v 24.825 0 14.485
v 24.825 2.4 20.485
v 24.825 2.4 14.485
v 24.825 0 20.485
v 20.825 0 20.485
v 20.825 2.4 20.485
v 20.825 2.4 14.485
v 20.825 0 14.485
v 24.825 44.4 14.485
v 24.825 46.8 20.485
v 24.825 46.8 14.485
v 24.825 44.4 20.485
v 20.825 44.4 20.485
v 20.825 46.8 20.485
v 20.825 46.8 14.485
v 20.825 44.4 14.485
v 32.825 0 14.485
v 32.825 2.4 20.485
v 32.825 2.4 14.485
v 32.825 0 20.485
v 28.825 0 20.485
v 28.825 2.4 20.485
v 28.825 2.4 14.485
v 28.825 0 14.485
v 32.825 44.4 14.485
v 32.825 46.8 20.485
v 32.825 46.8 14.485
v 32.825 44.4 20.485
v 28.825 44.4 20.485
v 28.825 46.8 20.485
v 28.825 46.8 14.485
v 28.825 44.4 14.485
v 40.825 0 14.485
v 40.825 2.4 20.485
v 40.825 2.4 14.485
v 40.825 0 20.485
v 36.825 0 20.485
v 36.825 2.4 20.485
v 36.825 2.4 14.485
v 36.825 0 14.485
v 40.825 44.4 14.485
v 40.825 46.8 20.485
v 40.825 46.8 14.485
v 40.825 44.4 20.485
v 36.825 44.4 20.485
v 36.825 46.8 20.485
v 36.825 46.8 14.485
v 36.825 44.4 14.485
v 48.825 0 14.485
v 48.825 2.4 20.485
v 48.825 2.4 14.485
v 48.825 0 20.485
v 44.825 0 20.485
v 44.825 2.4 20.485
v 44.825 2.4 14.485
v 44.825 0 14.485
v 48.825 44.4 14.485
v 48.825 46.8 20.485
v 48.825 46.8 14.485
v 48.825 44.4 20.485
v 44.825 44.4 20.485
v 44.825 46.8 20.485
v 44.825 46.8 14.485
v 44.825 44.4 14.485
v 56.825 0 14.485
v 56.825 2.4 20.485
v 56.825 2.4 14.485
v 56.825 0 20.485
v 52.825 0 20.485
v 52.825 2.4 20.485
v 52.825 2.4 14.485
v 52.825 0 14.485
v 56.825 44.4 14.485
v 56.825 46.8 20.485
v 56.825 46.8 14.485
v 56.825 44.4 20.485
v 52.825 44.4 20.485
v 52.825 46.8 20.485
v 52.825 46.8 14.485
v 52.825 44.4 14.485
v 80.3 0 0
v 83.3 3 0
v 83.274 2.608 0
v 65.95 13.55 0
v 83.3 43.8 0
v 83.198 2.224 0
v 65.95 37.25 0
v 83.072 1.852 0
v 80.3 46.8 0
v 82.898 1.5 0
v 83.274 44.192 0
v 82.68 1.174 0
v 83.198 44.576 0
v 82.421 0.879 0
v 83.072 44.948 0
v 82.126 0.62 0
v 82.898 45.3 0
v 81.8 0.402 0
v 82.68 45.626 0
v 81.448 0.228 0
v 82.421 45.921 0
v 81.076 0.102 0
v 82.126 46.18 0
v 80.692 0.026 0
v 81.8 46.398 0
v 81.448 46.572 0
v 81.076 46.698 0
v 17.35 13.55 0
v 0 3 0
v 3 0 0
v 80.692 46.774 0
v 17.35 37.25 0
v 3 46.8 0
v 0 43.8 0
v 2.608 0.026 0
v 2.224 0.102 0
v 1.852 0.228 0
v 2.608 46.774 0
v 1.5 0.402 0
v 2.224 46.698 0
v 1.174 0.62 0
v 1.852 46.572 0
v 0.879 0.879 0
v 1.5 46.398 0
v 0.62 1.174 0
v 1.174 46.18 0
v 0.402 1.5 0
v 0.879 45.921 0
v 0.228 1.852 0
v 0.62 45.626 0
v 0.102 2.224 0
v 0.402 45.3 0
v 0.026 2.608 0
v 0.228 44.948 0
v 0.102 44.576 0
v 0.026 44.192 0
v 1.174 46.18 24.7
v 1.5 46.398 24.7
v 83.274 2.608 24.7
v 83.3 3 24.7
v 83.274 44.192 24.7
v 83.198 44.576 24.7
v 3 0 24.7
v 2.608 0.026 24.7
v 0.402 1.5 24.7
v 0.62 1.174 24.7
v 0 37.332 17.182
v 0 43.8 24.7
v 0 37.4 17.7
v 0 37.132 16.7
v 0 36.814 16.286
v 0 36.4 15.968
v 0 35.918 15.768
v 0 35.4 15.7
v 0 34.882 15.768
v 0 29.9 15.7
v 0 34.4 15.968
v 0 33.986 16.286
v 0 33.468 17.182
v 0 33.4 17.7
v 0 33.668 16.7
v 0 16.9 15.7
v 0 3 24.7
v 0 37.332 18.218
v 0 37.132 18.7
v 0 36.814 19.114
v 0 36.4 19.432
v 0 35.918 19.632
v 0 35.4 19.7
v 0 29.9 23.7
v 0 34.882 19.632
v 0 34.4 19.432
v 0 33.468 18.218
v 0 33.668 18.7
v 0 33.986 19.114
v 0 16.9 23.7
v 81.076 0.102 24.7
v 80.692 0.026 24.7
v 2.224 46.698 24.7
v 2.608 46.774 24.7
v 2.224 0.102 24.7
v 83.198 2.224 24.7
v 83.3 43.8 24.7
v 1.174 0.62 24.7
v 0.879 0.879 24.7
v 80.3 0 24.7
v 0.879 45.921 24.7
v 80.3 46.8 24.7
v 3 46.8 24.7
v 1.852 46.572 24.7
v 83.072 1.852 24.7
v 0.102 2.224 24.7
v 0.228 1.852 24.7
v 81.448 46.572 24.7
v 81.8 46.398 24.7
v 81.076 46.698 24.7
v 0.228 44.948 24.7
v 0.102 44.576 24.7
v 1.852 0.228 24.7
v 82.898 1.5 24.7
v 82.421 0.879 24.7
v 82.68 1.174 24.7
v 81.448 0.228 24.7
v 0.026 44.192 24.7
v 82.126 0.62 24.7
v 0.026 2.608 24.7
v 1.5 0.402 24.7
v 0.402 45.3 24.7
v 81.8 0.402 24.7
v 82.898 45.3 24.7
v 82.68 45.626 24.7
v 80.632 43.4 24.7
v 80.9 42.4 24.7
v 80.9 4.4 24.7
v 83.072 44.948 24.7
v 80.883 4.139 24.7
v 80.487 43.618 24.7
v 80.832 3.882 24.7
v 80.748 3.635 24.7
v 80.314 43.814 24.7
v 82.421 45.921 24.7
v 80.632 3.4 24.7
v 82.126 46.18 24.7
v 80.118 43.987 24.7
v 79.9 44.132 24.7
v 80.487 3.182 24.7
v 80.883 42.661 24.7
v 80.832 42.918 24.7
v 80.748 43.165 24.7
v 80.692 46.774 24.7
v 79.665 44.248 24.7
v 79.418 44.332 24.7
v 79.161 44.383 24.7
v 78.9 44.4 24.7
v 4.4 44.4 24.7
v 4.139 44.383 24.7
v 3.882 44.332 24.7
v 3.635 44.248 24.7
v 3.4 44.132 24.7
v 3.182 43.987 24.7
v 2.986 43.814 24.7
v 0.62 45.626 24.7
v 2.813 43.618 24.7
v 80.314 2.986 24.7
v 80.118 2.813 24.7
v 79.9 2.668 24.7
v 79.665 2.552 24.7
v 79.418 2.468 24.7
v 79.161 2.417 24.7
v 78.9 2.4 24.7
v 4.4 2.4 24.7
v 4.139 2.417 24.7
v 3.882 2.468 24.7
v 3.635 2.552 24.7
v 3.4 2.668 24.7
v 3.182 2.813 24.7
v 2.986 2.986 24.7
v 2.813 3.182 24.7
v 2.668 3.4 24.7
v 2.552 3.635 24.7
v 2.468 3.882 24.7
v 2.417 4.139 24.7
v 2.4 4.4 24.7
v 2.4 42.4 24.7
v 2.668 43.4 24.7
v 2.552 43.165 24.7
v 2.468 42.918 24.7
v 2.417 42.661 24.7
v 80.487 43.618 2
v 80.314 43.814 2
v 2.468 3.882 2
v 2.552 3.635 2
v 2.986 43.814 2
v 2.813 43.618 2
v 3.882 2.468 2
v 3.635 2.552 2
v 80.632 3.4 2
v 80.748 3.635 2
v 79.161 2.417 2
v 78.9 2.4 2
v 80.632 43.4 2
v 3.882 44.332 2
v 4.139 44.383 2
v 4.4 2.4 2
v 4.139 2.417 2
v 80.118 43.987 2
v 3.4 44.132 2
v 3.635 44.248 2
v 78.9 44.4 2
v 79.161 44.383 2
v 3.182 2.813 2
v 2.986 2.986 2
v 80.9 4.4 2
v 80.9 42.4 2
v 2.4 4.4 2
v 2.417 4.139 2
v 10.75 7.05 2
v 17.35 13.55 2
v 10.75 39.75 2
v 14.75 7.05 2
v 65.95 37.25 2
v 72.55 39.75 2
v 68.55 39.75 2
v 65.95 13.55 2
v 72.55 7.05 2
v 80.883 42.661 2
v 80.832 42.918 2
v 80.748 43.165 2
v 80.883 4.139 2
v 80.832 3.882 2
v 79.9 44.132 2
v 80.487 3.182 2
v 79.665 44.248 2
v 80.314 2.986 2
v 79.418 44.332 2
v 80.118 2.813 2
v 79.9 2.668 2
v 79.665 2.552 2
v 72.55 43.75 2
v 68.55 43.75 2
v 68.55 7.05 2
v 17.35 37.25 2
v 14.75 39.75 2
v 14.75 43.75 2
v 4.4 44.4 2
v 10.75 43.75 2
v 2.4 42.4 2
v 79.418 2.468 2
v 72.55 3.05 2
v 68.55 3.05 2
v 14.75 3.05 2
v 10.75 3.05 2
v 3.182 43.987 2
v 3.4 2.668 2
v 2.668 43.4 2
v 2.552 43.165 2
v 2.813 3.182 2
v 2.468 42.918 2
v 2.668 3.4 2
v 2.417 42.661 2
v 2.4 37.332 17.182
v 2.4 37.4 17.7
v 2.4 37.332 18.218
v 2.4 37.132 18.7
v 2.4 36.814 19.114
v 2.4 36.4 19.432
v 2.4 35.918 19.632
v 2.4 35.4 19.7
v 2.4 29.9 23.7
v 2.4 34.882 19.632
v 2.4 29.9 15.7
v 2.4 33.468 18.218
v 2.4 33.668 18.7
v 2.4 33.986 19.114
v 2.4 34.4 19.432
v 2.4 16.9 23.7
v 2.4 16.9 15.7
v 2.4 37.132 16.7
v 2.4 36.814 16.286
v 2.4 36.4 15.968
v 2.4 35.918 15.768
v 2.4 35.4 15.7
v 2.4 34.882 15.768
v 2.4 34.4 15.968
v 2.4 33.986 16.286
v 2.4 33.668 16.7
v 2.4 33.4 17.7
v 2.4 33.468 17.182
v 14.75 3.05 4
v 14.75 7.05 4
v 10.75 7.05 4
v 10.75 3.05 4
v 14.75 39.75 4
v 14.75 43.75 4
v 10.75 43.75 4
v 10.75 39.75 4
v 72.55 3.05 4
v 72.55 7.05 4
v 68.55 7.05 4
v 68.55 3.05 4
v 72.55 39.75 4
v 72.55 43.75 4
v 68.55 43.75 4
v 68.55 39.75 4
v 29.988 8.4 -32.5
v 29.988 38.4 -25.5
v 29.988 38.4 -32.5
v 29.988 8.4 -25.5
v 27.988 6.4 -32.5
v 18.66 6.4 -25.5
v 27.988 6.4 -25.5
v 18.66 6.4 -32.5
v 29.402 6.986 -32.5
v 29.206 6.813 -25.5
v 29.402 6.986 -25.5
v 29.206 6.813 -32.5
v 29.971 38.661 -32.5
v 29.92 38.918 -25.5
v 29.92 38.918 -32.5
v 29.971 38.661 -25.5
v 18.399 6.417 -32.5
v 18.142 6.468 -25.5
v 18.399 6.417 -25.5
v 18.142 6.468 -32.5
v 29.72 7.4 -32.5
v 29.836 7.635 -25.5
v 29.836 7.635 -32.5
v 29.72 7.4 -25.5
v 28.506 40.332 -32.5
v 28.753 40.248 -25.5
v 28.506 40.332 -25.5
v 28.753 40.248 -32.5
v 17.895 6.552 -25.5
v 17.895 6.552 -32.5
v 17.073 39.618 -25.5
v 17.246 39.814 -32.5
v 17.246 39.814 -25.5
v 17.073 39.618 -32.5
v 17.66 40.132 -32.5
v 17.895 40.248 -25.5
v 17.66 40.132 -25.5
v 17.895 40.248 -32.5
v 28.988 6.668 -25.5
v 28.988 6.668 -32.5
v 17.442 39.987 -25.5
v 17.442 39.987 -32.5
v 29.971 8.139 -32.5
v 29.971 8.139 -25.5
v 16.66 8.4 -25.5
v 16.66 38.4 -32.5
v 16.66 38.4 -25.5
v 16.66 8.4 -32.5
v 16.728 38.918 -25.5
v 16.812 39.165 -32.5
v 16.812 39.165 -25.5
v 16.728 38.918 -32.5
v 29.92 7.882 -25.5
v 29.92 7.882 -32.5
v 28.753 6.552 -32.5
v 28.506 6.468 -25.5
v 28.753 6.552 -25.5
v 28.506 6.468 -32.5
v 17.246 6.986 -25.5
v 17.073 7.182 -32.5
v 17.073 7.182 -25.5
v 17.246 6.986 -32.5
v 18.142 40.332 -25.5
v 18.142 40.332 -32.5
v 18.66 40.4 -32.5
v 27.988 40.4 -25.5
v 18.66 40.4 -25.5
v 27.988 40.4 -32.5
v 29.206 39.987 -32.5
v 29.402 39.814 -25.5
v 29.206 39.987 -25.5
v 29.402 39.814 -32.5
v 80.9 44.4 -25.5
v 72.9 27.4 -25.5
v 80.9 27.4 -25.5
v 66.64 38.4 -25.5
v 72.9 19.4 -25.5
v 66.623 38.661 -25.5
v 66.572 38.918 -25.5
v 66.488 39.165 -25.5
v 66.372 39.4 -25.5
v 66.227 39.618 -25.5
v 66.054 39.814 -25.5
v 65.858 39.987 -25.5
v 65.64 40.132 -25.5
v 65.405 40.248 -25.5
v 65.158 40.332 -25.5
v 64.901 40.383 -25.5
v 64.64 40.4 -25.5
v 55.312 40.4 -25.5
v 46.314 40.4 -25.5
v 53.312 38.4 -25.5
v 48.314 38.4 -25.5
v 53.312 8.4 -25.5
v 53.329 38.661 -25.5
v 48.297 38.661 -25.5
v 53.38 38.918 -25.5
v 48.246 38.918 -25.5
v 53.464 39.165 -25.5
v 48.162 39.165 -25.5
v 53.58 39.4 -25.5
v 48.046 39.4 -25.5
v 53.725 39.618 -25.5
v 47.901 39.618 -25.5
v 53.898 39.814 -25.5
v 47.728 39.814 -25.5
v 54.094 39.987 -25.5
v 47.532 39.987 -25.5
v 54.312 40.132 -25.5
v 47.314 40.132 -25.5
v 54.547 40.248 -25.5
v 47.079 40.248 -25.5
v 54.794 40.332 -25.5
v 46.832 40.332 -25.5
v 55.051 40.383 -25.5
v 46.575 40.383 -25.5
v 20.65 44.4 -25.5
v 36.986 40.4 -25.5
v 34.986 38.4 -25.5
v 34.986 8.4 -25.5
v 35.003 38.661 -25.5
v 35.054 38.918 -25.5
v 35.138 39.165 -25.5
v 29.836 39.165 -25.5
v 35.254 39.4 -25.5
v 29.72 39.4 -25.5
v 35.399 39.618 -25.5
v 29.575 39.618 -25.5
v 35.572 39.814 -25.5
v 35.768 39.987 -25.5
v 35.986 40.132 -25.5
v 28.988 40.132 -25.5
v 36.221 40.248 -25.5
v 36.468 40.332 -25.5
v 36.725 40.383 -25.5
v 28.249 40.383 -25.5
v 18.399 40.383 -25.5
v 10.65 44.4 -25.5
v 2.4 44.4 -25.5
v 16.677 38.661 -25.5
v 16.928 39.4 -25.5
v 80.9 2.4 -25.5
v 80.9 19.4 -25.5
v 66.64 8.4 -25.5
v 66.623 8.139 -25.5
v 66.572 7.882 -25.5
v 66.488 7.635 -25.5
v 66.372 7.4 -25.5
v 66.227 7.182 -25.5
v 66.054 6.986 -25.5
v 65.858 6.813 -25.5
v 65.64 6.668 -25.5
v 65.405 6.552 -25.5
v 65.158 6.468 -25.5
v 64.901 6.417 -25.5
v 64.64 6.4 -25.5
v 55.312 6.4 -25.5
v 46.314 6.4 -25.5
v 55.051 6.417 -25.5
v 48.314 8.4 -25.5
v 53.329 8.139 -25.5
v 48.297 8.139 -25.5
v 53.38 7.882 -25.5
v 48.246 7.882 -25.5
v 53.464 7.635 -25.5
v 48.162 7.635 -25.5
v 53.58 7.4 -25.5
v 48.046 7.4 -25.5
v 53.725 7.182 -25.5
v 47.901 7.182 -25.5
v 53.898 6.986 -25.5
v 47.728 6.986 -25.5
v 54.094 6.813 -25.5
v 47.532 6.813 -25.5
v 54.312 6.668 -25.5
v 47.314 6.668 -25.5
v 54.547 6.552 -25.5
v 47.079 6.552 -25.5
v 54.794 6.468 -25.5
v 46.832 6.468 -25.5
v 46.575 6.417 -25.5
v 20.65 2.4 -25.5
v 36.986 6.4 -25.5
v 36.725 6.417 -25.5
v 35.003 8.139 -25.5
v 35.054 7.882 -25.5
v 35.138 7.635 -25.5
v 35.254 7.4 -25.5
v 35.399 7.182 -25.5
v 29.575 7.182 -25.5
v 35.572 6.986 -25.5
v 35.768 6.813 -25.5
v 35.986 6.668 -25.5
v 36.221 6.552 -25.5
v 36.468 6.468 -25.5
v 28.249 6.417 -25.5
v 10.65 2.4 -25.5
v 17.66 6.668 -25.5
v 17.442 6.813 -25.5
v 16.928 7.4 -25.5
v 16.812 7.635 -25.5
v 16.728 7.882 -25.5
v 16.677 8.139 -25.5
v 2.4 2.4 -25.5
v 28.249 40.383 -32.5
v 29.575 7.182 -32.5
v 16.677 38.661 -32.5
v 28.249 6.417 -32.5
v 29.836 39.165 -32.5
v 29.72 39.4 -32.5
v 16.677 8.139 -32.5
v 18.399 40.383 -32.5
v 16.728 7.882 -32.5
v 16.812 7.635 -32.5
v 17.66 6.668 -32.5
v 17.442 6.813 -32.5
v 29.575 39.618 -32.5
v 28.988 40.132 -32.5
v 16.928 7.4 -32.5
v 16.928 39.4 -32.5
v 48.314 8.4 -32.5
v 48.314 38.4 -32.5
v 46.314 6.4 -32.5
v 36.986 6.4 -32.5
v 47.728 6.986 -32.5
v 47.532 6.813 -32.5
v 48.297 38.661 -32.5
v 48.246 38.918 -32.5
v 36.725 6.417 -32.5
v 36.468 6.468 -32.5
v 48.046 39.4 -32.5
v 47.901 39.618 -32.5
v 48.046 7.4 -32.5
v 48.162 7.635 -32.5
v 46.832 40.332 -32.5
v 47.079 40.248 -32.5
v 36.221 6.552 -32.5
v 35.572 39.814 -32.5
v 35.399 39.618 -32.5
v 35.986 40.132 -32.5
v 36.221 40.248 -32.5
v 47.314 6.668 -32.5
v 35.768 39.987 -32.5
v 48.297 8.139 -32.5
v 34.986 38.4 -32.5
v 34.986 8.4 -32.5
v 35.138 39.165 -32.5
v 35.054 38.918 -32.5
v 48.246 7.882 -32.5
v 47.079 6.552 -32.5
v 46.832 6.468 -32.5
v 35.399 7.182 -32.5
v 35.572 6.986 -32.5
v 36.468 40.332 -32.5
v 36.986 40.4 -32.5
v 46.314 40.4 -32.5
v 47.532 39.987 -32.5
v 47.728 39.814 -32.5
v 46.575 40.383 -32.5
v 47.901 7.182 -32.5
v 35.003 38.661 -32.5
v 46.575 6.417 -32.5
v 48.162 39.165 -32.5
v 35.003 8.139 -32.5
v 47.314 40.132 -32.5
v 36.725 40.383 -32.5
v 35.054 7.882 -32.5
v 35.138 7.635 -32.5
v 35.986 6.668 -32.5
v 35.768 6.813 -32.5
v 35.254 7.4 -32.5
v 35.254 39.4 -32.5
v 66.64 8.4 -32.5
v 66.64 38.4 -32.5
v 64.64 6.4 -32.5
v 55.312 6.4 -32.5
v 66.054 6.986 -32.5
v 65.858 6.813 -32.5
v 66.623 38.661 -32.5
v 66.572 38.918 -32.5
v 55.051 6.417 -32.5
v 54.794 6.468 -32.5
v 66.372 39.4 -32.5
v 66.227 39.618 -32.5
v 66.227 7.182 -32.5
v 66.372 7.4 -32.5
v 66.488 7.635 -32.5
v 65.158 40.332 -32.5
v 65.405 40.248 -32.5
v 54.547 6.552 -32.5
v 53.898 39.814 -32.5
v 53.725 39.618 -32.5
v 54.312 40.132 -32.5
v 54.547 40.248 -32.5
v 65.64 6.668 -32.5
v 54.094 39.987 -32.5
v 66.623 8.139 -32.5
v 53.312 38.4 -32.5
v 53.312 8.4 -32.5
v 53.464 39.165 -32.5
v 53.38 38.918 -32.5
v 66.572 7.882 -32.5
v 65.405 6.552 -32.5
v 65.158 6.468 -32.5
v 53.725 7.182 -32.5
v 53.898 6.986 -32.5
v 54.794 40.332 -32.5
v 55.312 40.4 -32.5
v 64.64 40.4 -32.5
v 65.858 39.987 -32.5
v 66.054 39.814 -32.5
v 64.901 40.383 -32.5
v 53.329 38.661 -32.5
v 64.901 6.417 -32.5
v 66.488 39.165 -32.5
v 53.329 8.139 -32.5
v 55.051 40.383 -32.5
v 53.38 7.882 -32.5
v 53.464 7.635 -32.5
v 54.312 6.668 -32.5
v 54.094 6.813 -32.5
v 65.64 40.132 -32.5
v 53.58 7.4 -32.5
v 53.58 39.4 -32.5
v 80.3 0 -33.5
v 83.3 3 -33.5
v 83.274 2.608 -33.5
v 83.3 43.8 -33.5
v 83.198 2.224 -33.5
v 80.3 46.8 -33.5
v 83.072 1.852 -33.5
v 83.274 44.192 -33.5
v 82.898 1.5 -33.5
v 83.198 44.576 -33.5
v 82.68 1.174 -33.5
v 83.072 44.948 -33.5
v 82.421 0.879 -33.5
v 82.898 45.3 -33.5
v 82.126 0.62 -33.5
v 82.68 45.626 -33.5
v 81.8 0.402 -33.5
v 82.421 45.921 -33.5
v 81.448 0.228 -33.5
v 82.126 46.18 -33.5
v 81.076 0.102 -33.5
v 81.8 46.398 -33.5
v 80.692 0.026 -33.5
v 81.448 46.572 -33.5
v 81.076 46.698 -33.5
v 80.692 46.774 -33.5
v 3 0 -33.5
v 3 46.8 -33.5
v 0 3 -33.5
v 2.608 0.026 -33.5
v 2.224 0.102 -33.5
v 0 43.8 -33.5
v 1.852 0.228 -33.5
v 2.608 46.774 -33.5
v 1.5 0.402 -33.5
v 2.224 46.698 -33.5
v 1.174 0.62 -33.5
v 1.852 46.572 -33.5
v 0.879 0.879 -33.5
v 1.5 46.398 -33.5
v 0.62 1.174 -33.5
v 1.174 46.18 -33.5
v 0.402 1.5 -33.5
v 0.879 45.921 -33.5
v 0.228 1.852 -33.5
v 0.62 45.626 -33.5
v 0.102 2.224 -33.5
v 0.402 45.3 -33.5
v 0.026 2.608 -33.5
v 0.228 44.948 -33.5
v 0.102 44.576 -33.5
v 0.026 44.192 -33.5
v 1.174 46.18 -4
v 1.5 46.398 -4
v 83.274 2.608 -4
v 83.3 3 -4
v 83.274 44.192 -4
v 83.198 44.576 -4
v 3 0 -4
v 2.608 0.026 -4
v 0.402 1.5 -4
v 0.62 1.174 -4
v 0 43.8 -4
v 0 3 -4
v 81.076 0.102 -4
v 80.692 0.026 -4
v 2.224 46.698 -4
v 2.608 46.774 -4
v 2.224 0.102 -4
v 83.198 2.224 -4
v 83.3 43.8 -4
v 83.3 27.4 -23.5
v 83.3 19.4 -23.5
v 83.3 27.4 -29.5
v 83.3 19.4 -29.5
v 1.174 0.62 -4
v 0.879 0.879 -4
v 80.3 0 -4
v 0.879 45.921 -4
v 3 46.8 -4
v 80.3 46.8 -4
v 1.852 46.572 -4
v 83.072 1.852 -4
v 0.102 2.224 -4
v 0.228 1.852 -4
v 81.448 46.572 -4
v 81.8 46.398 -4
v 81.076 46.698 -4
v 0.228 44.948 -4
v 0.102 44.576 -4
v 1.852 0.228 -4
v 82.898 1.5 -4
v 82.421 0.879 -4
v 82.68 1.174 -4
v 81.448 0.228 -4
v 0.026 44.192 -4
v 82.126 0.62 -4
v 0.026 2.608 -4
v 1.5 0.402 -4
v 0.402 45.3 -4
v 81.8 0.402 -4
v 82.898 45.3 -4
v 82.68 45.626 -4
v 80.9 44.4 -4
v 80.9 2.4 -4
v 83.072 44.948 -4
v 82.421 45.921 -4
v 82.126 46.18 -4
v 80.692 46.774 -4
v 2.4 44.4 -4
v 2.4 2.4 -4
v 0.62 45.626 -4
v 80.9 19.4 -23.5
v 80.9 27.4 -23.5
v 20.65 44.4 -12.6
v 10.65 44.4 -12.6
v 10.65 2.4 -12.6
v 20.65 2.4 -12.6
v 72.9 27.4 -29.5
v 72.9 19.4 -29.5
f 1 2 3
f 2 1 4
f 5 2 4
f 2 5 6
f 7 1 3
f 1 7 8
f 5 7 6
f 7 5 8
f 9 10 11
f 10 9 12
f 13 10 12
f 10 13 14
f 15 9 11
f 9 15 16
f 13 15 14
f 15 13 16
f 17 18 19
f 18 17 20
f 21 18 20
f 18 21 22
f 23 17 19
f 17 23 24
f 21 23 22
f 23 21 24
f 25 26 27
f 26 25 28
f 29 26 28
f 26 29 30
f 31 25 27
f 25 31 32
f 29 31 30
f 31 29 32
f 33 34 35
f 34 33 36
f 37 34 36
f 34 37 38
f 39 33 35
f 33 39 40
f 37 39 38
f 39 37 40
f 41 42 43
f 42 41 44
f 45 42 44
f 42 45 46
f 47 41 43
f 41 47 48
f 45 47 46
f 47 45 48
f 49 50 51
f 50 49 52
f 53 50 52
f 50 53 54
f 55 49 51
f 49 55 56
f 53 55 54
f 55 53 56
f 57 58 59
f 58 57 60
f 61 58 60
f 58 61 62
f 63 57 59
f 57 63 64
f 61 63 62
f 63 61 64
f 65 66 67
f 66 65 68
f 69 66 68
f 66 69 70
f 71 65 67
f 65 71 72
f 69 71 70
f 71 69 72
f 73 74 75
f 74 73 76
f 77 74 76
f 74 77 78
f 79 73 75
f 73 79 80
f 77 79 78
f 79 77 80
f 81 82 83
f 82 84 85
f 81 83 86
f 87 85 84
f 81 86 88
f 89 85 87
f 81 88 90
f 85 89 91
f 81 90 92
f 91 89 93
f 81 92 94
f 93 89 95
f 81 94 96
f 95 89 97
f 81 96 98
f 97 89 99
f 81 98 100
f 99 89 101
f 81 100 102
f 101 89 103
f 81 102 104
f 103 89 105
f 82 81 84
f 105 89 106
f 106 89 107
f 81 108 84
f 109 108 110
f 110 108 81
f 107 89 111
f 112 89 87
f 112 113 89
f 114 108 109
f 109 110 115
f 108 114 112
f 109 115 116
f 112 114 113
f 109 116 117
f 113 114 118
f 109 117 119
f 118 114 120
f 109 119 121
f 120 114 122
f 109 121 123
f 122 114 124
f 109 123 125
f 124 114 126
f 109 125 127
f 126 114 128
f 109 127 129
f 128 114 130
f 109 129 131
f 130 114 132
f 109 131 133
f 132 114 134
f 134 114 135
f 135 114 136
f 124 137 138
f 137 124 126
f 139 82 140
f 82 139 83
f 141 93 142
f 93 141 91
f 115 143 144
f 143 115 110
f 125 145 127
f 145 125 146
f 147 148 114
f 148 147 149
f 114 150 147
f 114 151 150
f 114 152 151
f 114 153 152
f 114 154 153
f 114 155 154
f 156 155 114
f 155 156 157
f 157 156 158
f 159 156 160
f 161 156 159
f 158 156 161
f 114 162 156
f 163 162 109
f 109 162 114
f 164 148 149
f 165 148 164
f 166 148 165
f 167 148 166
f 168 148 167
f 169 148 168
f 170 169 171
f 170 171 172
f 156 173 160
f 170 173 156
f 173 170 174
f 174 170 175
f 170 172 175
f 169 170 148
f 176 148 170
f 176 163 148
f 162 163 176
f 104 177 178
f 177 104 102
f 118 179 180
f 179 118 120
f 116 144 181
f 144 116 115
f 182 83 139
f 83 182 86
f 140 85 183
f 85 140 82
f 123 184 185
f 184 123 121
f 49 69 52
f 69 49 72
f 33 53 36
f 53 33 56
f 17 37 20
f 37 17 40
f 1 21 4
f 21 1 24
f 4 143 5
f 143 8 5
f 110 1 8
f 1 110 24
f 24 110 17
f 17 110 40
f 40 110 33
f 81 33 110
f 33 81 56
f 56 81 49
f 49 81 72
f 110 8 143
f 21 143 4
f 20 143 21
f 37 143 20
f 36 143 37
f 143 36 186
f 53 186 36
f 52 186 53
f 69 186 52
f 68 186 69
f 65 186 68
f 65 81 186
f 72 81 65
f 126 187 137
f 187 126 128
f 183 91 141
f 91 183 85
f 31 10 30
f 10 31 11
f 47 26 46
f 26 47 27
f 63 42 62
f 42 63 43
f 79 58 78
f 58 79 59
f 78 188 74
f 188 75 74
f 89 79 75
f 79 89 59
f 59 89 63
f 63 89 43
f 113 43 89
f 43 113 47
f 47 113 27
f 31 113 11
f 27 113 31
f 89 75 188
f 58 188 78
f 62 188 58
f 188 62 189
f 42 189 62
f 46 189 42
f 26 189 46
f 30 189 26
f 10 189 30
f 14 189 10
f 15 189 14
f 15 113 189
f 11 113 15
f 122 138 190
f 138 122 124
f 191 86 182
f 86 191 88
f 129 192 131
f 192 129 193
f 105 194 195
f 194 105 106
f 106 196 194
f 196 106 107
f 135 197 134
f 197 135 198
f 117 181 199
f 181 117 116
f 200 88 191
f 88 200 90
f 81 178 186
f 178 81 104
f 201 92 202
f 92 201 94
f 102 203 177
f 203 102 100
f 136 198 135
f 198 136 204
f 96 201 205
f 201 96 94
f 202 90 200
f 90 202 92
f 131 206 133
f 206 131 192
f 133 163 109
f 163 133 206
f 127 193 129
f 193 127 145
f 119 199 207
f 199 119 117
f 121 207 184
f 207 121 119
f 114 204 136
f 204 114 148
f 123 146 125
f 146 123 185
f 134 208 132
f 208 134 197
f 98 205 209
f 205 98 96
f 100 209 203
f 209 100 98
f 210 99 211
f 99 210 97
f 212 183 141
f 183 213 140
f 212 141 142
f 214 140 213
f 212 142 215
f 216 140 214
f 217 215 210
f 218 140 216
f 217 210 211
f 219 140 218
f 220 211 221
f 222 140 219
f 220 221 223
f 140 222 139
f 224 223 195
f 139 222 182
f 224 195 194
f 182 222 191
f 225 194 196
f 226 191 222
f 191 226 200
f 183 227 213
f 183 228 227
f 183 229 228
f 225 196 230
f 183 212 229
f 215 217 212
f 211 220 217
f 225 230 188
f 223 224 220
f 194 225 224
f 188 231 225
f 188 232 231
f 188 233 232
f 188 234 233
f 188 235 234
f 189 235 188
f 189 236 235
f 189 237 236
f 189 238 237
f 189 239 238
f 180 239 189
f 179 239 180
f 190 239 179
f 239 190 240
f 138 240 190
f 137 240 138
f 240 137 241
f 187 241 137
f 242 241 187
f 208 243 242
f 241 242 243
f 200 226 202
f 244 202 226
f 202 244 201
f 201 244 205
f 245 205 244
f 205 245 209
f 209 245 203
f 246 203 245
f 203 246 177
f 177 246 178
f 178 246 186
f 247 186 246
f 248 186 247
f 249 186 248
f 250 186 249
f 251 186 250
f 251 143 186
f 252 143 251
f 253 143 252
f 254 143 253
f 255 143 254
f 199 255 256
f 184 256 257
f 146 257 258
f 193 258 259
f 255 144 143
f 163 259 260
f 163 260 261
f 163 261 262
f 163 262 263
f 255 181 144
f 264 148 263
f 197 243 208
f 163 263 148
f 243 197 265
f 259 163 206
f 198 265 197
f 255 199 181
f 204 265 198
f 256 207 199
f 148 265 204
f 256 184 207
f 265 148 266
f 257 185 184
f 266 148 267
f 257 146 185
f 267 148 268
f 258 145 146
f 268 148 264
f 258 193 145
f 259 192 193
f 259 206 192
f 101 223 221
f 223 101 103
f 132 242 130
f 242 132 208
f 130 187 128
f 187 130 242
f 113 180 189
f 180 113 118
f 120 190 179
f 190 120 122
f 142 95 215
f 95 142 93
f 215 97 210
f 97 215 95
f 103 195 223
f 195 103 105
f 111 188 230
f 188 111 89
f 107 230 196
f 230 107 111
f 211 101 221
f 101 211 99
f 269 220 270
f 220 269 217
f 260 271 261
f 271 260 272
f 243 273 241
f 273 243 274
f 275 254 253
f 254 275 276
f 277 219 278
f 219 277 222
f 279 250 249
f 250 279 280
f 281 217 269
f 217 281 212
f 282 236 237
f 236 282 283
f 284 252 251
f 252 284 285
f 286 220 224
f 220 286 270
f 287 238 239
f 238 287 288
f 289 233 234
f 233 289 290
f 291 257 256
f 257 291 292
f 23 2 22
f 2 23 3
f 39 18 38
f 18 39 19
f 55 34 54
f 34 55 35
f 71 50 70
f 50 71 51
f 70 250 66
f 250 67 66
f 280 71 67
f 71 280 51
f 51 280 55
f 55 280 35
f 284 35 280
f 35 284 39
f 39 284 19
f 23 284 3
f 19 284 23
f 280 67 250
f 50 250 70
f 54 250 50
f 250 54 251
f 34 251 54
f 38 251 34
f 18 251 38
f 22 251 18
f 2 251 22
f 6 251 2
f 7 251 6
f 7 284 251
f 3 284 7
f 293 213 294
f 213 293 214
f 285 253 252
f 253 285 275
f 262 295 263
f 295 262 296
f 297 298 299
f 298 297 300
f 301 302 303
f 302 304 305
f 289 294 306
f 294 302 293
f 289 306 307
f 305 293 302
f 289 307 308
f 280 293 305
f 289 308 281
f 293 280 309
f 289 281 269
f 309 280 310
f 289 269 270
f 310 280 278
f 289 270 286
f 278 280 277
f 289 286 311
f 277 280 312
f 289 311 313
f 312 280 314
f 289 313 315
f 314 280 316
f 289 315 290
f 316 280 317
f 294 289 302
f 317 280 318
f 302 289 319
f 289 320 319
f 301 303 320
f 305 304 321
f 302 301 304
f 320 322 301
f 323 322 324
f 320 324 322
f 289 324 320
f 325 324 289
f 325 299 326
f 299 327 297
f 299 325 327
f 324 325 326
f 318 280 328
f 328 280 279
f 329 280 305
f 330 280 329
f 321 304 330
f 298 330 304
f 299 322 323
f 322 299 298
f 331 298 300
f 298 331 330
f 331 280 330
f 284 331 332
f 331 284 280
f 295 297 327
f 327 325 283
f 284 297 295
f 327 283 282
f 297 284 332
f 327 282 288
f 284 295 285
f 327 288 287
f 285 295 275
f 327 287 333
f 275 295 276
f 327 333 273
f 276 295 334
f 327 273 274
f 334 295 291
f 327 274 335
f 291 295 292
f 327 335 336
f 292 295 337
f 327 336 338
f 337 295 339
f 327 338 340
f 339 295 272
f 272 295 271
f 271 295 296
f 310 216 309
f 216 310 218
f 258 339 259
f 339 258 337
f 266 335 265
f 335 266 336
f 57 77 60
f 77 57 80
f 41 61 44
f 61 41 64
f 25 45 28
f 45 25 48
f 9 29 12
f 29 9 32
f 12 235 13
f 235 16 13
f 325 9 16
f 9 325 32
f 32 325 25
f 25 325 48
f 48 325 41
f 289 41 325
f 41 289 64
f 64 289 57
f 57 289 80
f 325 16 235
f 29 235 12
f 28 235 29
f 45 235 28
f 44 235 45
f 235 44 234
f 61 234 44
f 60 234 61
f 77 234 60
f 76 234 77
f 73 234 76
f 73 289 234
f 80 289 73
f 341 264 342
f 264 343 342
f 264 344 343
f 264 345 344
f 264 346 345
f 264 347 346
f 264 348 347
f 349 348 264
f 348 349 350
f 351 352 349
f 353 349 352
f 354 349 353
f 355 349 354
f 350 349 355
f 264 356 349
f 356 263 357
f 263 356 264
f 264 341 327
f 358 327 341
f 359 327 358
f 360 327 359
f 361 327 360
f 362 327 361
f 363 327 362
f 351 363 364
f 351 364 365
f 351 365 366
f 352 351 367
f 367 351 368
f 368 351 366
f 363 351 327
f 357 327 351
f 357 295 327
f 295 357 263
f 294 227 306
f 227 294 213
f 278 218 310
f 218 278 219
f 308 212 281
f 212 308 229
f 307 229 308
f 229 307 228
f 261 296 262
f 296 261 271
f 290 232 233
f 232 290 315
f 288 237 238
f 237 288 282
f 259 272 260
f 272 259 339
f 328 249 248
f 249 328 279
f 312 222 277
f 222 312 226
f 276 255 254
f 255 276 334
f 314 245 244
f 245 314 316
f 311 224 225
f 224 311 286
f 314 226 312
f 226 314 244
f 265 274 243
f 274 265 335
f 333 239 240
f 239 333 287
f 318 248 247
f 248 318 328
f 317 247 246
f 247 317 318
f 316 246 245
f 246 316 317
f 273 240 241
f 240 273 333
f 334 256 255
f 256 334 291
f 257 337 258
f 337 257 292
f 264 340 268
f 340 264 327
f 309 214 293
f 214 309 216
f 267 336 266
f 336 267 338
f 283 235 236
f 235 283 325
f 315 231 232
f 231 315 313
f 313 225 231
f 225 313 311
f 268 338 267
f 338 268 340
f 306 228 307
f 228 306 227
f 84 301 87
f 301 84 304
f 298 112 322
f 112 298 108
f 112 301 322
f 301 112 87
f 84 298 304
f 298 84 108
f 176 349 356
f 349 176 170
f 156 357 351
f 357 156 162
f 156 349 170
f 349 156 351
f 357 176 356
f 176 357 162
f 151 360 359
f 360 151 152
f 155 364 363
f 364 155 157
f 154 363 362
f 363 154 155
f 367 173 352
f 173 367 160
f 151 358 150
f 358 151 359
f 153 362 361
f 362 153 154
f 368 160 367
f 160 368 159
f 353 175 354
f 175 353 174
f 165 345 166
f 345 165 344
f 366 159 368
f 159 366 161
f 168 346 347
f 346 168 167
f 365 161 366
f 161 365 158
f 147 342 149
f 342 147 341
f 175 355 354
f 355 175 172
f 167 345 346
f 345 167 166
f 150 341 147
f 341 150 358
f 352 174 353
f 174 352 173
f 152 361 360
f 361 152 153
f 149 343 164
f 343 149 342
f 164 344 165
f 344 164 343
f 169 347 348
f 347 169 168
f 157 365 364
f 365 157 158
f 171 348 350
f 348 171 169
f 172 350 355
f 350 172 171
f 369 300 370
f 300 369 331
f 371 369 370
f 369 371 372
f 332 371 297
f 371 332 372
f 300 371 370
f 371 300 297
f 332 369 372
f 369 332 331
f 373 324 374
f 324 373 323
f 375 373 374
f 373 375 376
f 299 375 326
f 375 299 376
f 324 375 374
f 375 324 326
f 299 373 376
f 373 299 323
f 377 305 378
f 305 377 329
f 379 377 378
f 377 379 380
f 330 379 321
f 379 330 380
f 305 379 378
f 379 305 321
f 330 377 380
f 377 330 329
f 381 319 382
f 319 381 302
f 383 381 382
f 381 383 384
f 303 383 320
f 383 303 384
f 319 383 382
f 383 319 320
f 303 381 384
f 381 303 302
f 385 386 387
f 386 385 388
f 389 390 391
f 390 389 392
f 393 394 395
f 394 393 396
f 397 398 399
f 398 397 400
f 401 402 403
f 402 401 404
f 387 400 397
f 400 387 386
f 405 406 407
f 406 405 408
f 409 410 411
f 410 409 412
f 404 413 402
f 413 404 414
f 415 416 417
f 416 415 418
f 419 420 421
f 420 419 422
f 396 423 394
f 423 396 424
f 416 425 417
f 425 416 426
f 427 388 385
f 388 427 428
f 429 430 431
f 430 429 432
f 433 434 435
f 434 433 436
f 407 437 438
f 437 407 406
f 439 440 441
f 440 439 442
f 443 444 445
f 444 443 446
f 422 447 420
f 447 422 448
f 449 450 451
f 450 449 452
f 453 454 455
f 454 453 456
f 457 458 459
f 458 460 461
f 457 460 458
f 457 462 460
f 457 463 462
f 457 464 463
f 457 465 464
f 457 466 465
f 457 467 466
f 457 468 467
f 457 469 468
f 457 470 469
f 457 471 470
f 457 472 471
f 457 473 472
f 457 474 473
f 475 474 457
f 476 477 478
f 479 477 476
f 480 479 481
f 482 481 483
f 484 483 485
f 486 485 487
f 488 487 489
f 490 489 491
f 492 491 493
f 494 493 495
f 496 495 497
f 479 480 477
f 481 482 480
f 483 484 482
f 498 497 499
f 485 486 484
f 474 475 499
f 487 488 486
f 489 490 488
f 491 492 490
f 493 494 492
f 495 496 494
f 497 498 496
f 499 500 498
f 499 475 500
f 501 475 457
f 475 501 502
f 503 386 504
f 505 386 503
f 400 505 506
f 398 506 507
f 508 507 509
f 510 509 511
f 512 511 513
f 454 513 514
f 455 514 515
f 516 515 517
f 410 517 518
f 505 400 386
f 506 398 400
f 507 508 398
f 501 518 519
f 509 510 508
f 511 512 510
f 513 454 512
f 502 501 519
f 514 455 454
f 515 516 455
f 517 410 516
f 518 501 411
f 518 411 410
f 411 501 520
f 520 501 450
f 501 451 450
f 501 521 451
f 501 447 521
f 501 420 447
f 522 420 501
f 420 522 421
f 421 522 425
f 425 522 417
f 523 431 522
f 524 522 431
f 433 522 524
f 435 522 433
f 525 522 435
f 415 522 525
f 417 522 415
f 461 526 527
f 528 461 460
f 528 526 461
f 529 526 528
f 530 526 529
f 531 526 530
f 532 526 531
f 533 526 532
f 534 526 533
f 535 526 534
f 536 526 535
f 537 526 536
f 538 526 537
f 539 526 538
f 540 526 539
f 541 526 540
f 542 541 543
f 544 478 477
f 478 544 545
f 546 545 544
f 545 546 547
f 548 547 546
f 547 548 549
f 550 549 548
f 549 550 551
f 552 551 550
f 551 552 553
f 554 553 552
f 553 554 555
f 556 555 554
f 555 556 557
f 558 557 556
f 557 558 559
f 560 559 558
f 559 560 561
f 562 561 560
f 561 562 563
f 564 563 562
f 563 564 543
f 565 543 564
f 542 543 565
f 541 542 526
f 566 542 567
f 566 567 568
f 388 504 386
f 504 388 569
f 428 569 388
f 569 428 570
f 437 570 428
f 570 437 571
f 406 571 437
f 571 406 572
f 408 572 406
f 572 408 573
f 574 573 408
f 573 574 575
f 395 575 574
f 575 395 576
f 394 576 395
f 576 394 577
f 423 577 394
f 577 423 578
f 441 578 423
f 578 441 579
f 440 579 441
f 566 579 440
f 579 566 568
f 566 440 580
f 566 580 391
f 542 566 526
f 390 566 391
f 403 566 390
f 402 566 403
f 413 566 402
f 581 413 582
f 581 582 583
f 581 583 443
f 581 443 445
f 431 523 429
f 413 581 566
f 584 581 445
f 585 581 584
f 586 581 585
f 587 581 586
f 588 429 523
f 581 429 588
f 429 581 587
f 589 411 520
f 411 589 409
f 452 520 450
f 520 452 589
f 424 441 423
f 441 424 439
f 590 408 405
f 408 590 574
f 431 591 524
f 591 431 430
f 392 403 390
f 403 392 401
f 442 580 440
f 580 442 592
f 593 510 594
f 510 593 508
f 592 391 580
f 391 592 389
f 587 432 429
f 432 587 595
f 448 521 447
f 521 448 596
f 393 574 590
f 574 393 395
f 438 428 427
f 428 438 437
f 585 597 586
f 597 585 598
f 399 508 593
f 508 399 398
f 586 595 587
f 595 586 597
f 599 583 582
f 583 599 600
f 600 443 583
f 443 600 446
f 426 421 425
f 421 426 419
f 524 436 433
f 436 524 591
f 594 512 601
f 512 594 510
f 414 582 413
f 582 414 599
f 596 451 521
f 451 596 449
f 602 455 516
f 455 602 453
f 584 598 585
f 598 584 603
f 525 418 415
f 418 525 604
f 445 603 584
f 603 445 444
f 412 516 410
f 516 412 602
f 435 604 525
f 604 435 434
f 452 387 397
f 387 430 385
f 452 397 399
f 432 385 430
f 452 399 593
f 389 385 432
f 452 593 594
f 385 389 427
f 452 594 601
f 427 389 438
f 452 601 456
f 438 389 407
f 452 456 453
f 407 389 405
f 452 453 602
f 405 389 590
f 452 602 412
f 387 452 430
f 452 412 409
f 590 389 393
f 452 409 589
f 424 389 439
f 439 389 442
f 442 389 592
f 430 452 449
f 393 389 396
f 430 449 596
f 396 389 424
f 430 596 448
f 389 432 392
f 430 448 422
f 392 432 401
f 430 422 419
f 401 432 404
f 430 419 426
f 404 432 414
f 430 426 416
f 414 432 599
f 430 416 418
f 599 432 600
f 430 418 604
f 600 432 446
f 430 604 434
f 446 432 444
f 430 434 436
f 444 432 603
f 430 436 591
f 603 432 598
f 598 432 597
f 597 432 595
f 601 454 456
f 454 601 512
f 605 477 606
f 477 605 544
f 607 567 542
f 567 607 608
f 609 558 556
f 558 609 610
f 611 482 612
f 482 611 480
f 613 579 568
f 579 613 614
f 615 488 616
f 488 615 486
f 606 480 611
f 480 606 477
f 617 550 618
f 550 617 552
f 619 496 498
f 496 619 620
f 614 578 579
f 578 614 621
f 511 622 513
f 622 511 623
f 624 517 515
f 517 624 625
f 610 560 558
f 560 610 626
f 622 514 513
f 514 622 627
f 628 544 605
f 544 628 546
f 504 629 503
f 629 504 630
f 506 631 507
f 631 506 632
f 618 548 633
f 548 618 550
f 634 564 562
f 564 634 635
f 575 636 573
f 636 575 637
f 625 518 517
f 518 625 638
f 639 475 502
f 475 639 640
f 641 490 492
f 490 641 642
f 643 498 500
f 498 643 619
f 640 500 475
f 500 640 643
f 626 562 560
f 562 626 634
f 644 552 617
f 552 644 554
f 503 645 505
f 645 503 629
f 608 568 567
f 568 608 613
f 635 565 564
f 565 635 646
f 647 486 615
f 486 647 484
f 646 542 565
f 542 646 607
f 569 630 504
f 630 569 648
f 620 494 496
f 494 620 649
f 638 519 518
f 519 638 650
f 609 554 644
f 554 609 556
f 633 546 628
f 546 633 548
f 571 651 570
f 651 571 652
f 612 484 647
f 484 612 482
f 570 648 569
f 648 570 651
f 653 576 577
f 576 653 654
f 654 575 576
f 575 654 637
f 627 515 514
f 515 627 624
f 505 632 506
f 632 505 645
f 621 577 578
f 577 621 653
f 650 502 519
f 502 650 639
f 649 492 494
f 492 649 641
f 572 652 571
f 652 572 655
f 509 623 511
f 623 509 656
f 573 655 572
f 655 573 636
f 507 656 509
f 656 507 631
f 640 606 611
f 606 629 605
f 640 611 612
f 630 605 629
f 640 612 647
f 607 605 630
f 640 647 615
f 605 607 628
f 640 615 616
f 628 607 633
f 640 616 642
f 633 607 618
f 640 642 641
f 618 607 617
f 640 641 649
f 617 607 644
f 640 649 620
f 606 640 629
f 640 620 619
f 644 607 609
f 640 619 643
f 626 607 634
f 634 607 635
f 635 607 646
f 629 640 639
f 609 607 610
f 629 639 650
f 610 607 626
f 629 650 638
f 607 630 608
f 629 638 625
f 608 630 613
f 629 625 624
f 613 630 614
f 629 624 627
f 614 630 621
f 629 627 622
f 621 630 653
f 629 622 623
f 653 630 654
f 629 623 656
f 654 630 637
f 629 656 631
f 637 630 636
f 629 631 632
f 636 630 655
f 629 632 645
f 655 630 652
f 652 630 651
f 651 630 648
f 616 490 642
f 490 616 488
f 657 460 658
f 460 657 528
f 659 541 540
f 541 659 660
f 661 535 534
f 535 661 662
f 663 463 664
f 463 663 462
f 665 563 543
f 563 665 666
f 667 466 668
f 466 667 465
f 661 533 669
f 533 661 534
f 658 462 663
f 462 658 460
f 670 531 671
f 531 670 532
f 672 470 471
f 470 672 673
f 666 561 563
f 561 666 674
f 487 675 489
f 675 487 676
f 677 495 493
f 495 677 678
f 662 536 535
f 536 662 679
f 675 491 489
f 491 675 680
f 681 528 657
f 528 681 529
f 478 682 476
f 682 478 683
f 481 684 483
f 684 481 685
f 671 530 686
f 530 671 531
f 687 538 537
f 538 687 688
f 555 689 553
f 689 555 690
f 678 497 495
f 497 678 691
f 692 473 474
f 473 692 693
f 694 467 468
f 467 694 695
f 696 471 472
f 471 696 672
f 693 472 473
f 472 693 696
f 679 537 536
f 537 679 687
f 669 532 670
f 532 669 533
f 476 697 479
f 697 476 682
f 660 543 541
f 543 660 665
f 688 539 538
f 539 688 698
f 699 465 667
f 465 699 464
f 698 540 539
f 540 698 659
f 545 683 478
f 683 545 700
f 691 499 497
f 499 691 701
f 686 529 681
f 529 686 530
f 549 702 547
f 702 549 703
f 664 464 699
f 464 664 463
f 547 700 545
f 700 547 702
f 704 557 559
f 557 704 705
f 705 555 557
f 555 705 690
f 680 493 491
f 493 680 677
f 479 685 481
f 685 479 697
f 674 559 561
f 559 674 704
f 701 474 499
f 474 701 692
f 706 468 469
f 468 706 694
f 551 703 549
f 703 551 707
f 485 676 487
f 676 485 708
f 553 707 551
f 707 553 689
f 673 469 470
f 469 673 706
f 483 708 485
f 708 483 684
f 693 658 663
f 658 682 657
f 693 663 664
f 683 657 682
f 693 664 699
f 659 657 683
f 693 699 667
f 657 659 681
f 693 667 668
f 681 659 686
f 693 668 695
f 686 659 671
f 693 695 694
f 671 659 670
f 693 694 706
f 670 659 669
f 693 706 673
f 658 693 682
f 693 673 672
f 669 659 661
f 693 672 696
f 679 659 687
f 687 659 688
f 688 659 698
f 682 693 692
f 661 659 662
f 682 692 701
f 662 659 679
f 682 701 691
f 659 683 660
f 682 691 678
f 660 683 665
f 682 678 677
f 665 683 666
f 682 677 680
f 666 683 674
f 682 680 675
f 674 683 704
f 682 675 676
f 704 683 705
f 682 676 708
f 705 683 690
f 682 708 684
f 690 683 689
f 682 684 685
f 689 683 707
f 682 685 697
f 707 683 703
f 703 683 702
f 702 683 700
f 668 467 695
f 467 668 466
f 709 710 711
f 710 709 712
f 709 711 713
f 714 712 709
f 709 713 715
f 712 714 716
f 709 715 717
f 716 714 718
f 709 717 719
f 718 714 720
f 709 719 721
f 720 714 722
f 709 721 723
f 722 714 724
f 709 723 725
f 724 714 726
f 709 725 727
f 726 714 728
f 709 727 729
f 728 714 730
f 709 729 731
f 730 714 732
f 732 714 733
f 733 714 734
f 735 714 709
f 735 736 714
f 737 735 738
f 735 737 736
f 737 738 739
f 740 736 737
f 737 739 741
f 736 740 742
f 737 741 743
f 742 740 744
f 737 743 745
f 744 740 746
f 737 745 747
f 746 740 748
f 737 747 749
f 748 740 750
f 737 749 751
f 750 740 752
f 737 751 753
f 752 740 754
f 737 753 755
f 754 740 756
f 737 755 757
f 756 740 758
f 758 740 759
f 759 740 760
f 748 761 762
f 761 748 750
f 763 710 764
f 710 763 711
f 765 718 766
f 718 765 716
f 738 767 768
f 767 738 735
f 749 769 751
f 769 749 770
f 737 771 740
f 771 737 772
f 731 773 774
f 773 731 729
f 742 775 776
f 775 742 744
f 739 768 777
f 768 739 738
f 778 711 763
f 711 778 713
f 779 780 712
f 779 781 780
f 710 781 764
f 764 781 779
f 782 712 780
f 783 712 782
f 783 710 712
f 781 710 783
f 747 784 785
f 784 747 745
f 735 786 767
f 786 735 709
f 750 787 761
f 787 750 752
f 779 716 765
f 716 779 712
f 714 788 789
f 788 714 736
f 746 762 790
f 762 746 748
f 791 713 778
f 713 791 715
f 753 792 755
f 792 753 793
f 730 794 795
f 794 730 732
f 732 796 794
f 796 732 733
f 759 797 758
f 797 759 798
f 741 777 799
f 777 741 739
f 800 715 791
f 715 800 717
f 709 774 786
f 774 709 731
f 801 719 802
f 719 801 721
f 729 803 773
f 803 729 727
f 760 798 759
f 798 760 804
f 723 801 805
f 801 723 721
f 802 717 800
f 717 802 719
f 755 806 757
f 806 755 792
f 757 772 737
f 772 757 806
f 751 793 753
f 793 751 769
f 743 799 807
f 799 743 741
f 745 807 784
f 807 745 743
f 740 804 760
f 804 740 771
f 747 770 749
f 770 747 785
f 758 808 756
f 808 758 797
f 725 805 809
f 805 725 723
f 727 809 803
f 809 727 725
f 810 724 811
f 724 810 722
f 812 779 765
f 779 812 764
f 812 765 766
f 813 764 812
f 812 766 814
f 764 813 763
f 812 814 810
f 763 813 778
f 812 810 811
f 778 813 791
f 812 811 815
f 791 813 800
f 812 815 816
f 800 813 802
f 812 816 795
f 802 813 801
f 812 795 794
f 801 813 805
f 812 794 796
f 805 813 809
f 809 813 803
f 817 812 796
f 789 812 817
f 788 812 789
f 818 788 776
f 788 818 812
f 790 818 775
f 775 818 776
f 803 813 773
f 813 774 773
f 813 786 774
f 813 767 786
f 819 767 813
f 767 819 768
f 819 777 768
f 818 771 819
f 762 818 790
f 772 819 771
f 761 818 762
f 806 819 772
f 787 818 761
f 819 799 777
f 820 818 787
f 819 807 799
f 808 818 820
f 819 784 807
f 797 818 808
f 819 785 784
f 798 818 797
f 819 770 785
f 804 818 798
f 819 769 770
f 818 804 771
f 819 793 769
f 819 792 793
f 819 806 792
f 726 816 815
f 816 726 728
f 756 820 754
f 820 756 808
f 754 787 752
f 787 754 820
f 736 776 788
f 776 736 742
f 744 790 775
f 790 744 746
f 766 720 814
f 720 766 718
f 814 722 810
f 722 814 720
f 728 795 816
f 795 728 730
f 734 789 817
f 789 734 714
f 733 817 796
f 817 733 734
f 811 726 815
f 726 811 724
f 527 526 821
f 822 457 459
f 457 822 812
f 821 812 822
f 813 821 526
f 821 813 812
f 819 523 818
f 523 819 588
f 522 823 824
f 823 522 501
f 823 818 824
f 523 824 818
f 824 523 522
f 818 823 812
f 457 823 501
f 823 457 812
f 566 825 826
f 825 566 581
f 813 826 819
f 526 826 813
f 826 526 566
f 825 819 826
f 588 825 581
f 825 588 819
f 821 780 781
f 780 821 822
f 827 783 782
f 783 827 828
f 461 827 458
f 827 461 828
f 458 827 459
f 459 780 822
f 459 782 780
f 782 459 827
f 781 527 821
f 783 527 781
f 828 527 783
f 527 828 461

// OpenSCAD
// ESP32 eInk Room Node - printable enclosure
// ============================================
// Front shell: frames the 2.13" eInk FeatherWing (Adafruit 4195/4814) with
// the Feather ESP32-S2 stacked behind it. Back tray: cradle for a
// BH-18650-PC4 2x18650 holder, stood off from the electronics with an air
// gap (battery mass = thermal ballast we do NOT want against the BME280).
//
// Everything is parametric; print a test fit, tweak, re-render.
// Render: openscad -o out.stl cad/enclosure.scad
// Preview: openscad -o out.png --imgsize 1200,900 cad/enclosure.scad

// ---- print/fit tuning ----
tol = 0.25;          // XY clearance for press-fit pockets (0.4mm nozzle FDM)
wall = 2.4;          // shell wall thickness (6 perimeters at 0.4)
floor_t = 2.0;       // flat faces

// ---- FeatherWing (display) ----
wing_l = 61.3;       // PCB long edge (display landscape)
wing_w = 40.2;       // PCB short edge
wing_t = 6.7;        // PCB + display glass stack thickness
// visible active area of the 2.13" panel, offset within the wing PCB
disp_l = 48.6;
disp_w = 23.7;
disp_off_x = 0;      // tune from fab print / test fit
disp_off_y = 2.0;    // display sits toward the top edge, away from pin rows

// ---- Feather ESP32-S2 (stacks behind the wing) ----
feather_l = 50.8;
feather_w = 22.86;
stack_h = 14;        // wing underside to feather underside incl. headers

// ---- BH-18650-PC4 dual 18650 holder ----
bh_l = 78.0;
bh_w = 41.5;
bh_h = 21.5;
bh_standoff = 6;     // "a little bit of spacing" behind the electronics

// ---- derived case body ----
case_l = max(wing_l, bh_l) + 2 * (wall + tol);   // holder is the widest part
case_w = max(wing_w, bh_w) + 2 * (wall + tol);
front_depth = wing_t + stack_h + 2;              // display shell cavity
back_depth = bh_h + bh_standoff;                 // battery bay depth

module rounded_box(l, w, h, r = 3) {
  hull()
    for (x = [r, l - r], y = [r, w - r])
      translate([x, y, 0]) cylinder(h = h, r = r, $fn = 48);
}

// ================= FRONT SHELL =================
module front_shell() {
  difference() {
    rounded_box(case_l, case_w, front_depth + floor_t);
    // interior cavity
    translate([wall, wall, floor_t])
      rounded_box(case_l - 2 * wall, case_w - 2 * wall, front_depth + 1, 2);
    // display window through the front face
    translate([(case_l - disp_l) / 2 + disp_off_x,
               (case_w - disp_w) / 2 + disp_off_y, -1])
      cube([disp_l, disp_w, floor_t + 2]);
    // side vents for the BME280 (long edge, both sides)
    for (i = [0:4])
      for (side = [0, 1])
        translate([case_l * 0.25 + i * 8, side * (case_w - wall) - 0.5,
                   floor_t + front_depth * 0.55])
          cube([4, wall + 1, 6]);
    // USB-C cutout, Feather short edge (left wall)
    translate([-1, (case_w - 13) / 2, floor_t + front_depth - stack_h / 2 - 2])
      cube([wall + 2, 13, 8]);
    // BOOT button access hole (page flip), same wall as USB
    translate([-1, (case_w) / 2 + 12, floor_t + front_depth - stack_h / 2])
      rotate([0, 90, 0]) cylinder(h = wall + 2, d = 4, $fn = 24);
  }
  // wing support ledge: corner posts the wing PCB rests on, display-first
  for (x = [(case_l - wing_l) / 2 - tol, (case_l + wing_l) / 2 - 4 + tol],
       y = [(case_w - wing_w) / 2 - tol, (case_w + wing_w) / 2 - 4 + tol])
    translate([x, y, floor_t])
      cube([4, 4, front_depth - stack_h - wing_t]);
}

// ================= BACK TRAY =================
module back_tray() {
  difference() {
    rounded_box(case_l, case_w, back_depth + floor_t);
    // battery holder pocket, snug
    translate([(case_l - bh_l) / 2 - tol, (case_w - bh_w) / 2 - tol,
               floor_t + bh_standoff])
      cube([bh_l + 2 * tol, bh_w + 2 * tol, bh_h + 2]);
    // standoff air gap windows (thermal break + weight)
    for (i = [0:2])
      translate([case_l * 0.2 + i * case_l * 0.22, wall + 4, floor_t - 1])
        rounded_box(case_l * 0.16, case_w - 2 * wall - 8, bh_standoff + 1, 2);
    // wire pass-through into the front shell
    translate([case_l - wall - 8, (case_w - 8) / 2, floor_t + bh_standoff - 4])
      cube([12, 8, 6]);
  }
  // holder retention nubs (leads end stays open for the wires)
  for (y = [(case_w - bh_w) / 2 - tol - 1.6, (case_w + bh_w) / 2 + tol])
    translate([(case_l - bh_l) / 2 + 8, y, floor_t + bh_standoff])
      cube([10, 1.6, bh_h * 0.6]);
}

// ================= LAYOUT =================
part = "assembly";  // "front" | "back" | "assembly"

if (part == "front") front_shell();
else if (part == "back") back_tray();
else {
  front_shell();
  translate([0, 0, -(back_depth + floor_t + 4)]) back_tray();
}
